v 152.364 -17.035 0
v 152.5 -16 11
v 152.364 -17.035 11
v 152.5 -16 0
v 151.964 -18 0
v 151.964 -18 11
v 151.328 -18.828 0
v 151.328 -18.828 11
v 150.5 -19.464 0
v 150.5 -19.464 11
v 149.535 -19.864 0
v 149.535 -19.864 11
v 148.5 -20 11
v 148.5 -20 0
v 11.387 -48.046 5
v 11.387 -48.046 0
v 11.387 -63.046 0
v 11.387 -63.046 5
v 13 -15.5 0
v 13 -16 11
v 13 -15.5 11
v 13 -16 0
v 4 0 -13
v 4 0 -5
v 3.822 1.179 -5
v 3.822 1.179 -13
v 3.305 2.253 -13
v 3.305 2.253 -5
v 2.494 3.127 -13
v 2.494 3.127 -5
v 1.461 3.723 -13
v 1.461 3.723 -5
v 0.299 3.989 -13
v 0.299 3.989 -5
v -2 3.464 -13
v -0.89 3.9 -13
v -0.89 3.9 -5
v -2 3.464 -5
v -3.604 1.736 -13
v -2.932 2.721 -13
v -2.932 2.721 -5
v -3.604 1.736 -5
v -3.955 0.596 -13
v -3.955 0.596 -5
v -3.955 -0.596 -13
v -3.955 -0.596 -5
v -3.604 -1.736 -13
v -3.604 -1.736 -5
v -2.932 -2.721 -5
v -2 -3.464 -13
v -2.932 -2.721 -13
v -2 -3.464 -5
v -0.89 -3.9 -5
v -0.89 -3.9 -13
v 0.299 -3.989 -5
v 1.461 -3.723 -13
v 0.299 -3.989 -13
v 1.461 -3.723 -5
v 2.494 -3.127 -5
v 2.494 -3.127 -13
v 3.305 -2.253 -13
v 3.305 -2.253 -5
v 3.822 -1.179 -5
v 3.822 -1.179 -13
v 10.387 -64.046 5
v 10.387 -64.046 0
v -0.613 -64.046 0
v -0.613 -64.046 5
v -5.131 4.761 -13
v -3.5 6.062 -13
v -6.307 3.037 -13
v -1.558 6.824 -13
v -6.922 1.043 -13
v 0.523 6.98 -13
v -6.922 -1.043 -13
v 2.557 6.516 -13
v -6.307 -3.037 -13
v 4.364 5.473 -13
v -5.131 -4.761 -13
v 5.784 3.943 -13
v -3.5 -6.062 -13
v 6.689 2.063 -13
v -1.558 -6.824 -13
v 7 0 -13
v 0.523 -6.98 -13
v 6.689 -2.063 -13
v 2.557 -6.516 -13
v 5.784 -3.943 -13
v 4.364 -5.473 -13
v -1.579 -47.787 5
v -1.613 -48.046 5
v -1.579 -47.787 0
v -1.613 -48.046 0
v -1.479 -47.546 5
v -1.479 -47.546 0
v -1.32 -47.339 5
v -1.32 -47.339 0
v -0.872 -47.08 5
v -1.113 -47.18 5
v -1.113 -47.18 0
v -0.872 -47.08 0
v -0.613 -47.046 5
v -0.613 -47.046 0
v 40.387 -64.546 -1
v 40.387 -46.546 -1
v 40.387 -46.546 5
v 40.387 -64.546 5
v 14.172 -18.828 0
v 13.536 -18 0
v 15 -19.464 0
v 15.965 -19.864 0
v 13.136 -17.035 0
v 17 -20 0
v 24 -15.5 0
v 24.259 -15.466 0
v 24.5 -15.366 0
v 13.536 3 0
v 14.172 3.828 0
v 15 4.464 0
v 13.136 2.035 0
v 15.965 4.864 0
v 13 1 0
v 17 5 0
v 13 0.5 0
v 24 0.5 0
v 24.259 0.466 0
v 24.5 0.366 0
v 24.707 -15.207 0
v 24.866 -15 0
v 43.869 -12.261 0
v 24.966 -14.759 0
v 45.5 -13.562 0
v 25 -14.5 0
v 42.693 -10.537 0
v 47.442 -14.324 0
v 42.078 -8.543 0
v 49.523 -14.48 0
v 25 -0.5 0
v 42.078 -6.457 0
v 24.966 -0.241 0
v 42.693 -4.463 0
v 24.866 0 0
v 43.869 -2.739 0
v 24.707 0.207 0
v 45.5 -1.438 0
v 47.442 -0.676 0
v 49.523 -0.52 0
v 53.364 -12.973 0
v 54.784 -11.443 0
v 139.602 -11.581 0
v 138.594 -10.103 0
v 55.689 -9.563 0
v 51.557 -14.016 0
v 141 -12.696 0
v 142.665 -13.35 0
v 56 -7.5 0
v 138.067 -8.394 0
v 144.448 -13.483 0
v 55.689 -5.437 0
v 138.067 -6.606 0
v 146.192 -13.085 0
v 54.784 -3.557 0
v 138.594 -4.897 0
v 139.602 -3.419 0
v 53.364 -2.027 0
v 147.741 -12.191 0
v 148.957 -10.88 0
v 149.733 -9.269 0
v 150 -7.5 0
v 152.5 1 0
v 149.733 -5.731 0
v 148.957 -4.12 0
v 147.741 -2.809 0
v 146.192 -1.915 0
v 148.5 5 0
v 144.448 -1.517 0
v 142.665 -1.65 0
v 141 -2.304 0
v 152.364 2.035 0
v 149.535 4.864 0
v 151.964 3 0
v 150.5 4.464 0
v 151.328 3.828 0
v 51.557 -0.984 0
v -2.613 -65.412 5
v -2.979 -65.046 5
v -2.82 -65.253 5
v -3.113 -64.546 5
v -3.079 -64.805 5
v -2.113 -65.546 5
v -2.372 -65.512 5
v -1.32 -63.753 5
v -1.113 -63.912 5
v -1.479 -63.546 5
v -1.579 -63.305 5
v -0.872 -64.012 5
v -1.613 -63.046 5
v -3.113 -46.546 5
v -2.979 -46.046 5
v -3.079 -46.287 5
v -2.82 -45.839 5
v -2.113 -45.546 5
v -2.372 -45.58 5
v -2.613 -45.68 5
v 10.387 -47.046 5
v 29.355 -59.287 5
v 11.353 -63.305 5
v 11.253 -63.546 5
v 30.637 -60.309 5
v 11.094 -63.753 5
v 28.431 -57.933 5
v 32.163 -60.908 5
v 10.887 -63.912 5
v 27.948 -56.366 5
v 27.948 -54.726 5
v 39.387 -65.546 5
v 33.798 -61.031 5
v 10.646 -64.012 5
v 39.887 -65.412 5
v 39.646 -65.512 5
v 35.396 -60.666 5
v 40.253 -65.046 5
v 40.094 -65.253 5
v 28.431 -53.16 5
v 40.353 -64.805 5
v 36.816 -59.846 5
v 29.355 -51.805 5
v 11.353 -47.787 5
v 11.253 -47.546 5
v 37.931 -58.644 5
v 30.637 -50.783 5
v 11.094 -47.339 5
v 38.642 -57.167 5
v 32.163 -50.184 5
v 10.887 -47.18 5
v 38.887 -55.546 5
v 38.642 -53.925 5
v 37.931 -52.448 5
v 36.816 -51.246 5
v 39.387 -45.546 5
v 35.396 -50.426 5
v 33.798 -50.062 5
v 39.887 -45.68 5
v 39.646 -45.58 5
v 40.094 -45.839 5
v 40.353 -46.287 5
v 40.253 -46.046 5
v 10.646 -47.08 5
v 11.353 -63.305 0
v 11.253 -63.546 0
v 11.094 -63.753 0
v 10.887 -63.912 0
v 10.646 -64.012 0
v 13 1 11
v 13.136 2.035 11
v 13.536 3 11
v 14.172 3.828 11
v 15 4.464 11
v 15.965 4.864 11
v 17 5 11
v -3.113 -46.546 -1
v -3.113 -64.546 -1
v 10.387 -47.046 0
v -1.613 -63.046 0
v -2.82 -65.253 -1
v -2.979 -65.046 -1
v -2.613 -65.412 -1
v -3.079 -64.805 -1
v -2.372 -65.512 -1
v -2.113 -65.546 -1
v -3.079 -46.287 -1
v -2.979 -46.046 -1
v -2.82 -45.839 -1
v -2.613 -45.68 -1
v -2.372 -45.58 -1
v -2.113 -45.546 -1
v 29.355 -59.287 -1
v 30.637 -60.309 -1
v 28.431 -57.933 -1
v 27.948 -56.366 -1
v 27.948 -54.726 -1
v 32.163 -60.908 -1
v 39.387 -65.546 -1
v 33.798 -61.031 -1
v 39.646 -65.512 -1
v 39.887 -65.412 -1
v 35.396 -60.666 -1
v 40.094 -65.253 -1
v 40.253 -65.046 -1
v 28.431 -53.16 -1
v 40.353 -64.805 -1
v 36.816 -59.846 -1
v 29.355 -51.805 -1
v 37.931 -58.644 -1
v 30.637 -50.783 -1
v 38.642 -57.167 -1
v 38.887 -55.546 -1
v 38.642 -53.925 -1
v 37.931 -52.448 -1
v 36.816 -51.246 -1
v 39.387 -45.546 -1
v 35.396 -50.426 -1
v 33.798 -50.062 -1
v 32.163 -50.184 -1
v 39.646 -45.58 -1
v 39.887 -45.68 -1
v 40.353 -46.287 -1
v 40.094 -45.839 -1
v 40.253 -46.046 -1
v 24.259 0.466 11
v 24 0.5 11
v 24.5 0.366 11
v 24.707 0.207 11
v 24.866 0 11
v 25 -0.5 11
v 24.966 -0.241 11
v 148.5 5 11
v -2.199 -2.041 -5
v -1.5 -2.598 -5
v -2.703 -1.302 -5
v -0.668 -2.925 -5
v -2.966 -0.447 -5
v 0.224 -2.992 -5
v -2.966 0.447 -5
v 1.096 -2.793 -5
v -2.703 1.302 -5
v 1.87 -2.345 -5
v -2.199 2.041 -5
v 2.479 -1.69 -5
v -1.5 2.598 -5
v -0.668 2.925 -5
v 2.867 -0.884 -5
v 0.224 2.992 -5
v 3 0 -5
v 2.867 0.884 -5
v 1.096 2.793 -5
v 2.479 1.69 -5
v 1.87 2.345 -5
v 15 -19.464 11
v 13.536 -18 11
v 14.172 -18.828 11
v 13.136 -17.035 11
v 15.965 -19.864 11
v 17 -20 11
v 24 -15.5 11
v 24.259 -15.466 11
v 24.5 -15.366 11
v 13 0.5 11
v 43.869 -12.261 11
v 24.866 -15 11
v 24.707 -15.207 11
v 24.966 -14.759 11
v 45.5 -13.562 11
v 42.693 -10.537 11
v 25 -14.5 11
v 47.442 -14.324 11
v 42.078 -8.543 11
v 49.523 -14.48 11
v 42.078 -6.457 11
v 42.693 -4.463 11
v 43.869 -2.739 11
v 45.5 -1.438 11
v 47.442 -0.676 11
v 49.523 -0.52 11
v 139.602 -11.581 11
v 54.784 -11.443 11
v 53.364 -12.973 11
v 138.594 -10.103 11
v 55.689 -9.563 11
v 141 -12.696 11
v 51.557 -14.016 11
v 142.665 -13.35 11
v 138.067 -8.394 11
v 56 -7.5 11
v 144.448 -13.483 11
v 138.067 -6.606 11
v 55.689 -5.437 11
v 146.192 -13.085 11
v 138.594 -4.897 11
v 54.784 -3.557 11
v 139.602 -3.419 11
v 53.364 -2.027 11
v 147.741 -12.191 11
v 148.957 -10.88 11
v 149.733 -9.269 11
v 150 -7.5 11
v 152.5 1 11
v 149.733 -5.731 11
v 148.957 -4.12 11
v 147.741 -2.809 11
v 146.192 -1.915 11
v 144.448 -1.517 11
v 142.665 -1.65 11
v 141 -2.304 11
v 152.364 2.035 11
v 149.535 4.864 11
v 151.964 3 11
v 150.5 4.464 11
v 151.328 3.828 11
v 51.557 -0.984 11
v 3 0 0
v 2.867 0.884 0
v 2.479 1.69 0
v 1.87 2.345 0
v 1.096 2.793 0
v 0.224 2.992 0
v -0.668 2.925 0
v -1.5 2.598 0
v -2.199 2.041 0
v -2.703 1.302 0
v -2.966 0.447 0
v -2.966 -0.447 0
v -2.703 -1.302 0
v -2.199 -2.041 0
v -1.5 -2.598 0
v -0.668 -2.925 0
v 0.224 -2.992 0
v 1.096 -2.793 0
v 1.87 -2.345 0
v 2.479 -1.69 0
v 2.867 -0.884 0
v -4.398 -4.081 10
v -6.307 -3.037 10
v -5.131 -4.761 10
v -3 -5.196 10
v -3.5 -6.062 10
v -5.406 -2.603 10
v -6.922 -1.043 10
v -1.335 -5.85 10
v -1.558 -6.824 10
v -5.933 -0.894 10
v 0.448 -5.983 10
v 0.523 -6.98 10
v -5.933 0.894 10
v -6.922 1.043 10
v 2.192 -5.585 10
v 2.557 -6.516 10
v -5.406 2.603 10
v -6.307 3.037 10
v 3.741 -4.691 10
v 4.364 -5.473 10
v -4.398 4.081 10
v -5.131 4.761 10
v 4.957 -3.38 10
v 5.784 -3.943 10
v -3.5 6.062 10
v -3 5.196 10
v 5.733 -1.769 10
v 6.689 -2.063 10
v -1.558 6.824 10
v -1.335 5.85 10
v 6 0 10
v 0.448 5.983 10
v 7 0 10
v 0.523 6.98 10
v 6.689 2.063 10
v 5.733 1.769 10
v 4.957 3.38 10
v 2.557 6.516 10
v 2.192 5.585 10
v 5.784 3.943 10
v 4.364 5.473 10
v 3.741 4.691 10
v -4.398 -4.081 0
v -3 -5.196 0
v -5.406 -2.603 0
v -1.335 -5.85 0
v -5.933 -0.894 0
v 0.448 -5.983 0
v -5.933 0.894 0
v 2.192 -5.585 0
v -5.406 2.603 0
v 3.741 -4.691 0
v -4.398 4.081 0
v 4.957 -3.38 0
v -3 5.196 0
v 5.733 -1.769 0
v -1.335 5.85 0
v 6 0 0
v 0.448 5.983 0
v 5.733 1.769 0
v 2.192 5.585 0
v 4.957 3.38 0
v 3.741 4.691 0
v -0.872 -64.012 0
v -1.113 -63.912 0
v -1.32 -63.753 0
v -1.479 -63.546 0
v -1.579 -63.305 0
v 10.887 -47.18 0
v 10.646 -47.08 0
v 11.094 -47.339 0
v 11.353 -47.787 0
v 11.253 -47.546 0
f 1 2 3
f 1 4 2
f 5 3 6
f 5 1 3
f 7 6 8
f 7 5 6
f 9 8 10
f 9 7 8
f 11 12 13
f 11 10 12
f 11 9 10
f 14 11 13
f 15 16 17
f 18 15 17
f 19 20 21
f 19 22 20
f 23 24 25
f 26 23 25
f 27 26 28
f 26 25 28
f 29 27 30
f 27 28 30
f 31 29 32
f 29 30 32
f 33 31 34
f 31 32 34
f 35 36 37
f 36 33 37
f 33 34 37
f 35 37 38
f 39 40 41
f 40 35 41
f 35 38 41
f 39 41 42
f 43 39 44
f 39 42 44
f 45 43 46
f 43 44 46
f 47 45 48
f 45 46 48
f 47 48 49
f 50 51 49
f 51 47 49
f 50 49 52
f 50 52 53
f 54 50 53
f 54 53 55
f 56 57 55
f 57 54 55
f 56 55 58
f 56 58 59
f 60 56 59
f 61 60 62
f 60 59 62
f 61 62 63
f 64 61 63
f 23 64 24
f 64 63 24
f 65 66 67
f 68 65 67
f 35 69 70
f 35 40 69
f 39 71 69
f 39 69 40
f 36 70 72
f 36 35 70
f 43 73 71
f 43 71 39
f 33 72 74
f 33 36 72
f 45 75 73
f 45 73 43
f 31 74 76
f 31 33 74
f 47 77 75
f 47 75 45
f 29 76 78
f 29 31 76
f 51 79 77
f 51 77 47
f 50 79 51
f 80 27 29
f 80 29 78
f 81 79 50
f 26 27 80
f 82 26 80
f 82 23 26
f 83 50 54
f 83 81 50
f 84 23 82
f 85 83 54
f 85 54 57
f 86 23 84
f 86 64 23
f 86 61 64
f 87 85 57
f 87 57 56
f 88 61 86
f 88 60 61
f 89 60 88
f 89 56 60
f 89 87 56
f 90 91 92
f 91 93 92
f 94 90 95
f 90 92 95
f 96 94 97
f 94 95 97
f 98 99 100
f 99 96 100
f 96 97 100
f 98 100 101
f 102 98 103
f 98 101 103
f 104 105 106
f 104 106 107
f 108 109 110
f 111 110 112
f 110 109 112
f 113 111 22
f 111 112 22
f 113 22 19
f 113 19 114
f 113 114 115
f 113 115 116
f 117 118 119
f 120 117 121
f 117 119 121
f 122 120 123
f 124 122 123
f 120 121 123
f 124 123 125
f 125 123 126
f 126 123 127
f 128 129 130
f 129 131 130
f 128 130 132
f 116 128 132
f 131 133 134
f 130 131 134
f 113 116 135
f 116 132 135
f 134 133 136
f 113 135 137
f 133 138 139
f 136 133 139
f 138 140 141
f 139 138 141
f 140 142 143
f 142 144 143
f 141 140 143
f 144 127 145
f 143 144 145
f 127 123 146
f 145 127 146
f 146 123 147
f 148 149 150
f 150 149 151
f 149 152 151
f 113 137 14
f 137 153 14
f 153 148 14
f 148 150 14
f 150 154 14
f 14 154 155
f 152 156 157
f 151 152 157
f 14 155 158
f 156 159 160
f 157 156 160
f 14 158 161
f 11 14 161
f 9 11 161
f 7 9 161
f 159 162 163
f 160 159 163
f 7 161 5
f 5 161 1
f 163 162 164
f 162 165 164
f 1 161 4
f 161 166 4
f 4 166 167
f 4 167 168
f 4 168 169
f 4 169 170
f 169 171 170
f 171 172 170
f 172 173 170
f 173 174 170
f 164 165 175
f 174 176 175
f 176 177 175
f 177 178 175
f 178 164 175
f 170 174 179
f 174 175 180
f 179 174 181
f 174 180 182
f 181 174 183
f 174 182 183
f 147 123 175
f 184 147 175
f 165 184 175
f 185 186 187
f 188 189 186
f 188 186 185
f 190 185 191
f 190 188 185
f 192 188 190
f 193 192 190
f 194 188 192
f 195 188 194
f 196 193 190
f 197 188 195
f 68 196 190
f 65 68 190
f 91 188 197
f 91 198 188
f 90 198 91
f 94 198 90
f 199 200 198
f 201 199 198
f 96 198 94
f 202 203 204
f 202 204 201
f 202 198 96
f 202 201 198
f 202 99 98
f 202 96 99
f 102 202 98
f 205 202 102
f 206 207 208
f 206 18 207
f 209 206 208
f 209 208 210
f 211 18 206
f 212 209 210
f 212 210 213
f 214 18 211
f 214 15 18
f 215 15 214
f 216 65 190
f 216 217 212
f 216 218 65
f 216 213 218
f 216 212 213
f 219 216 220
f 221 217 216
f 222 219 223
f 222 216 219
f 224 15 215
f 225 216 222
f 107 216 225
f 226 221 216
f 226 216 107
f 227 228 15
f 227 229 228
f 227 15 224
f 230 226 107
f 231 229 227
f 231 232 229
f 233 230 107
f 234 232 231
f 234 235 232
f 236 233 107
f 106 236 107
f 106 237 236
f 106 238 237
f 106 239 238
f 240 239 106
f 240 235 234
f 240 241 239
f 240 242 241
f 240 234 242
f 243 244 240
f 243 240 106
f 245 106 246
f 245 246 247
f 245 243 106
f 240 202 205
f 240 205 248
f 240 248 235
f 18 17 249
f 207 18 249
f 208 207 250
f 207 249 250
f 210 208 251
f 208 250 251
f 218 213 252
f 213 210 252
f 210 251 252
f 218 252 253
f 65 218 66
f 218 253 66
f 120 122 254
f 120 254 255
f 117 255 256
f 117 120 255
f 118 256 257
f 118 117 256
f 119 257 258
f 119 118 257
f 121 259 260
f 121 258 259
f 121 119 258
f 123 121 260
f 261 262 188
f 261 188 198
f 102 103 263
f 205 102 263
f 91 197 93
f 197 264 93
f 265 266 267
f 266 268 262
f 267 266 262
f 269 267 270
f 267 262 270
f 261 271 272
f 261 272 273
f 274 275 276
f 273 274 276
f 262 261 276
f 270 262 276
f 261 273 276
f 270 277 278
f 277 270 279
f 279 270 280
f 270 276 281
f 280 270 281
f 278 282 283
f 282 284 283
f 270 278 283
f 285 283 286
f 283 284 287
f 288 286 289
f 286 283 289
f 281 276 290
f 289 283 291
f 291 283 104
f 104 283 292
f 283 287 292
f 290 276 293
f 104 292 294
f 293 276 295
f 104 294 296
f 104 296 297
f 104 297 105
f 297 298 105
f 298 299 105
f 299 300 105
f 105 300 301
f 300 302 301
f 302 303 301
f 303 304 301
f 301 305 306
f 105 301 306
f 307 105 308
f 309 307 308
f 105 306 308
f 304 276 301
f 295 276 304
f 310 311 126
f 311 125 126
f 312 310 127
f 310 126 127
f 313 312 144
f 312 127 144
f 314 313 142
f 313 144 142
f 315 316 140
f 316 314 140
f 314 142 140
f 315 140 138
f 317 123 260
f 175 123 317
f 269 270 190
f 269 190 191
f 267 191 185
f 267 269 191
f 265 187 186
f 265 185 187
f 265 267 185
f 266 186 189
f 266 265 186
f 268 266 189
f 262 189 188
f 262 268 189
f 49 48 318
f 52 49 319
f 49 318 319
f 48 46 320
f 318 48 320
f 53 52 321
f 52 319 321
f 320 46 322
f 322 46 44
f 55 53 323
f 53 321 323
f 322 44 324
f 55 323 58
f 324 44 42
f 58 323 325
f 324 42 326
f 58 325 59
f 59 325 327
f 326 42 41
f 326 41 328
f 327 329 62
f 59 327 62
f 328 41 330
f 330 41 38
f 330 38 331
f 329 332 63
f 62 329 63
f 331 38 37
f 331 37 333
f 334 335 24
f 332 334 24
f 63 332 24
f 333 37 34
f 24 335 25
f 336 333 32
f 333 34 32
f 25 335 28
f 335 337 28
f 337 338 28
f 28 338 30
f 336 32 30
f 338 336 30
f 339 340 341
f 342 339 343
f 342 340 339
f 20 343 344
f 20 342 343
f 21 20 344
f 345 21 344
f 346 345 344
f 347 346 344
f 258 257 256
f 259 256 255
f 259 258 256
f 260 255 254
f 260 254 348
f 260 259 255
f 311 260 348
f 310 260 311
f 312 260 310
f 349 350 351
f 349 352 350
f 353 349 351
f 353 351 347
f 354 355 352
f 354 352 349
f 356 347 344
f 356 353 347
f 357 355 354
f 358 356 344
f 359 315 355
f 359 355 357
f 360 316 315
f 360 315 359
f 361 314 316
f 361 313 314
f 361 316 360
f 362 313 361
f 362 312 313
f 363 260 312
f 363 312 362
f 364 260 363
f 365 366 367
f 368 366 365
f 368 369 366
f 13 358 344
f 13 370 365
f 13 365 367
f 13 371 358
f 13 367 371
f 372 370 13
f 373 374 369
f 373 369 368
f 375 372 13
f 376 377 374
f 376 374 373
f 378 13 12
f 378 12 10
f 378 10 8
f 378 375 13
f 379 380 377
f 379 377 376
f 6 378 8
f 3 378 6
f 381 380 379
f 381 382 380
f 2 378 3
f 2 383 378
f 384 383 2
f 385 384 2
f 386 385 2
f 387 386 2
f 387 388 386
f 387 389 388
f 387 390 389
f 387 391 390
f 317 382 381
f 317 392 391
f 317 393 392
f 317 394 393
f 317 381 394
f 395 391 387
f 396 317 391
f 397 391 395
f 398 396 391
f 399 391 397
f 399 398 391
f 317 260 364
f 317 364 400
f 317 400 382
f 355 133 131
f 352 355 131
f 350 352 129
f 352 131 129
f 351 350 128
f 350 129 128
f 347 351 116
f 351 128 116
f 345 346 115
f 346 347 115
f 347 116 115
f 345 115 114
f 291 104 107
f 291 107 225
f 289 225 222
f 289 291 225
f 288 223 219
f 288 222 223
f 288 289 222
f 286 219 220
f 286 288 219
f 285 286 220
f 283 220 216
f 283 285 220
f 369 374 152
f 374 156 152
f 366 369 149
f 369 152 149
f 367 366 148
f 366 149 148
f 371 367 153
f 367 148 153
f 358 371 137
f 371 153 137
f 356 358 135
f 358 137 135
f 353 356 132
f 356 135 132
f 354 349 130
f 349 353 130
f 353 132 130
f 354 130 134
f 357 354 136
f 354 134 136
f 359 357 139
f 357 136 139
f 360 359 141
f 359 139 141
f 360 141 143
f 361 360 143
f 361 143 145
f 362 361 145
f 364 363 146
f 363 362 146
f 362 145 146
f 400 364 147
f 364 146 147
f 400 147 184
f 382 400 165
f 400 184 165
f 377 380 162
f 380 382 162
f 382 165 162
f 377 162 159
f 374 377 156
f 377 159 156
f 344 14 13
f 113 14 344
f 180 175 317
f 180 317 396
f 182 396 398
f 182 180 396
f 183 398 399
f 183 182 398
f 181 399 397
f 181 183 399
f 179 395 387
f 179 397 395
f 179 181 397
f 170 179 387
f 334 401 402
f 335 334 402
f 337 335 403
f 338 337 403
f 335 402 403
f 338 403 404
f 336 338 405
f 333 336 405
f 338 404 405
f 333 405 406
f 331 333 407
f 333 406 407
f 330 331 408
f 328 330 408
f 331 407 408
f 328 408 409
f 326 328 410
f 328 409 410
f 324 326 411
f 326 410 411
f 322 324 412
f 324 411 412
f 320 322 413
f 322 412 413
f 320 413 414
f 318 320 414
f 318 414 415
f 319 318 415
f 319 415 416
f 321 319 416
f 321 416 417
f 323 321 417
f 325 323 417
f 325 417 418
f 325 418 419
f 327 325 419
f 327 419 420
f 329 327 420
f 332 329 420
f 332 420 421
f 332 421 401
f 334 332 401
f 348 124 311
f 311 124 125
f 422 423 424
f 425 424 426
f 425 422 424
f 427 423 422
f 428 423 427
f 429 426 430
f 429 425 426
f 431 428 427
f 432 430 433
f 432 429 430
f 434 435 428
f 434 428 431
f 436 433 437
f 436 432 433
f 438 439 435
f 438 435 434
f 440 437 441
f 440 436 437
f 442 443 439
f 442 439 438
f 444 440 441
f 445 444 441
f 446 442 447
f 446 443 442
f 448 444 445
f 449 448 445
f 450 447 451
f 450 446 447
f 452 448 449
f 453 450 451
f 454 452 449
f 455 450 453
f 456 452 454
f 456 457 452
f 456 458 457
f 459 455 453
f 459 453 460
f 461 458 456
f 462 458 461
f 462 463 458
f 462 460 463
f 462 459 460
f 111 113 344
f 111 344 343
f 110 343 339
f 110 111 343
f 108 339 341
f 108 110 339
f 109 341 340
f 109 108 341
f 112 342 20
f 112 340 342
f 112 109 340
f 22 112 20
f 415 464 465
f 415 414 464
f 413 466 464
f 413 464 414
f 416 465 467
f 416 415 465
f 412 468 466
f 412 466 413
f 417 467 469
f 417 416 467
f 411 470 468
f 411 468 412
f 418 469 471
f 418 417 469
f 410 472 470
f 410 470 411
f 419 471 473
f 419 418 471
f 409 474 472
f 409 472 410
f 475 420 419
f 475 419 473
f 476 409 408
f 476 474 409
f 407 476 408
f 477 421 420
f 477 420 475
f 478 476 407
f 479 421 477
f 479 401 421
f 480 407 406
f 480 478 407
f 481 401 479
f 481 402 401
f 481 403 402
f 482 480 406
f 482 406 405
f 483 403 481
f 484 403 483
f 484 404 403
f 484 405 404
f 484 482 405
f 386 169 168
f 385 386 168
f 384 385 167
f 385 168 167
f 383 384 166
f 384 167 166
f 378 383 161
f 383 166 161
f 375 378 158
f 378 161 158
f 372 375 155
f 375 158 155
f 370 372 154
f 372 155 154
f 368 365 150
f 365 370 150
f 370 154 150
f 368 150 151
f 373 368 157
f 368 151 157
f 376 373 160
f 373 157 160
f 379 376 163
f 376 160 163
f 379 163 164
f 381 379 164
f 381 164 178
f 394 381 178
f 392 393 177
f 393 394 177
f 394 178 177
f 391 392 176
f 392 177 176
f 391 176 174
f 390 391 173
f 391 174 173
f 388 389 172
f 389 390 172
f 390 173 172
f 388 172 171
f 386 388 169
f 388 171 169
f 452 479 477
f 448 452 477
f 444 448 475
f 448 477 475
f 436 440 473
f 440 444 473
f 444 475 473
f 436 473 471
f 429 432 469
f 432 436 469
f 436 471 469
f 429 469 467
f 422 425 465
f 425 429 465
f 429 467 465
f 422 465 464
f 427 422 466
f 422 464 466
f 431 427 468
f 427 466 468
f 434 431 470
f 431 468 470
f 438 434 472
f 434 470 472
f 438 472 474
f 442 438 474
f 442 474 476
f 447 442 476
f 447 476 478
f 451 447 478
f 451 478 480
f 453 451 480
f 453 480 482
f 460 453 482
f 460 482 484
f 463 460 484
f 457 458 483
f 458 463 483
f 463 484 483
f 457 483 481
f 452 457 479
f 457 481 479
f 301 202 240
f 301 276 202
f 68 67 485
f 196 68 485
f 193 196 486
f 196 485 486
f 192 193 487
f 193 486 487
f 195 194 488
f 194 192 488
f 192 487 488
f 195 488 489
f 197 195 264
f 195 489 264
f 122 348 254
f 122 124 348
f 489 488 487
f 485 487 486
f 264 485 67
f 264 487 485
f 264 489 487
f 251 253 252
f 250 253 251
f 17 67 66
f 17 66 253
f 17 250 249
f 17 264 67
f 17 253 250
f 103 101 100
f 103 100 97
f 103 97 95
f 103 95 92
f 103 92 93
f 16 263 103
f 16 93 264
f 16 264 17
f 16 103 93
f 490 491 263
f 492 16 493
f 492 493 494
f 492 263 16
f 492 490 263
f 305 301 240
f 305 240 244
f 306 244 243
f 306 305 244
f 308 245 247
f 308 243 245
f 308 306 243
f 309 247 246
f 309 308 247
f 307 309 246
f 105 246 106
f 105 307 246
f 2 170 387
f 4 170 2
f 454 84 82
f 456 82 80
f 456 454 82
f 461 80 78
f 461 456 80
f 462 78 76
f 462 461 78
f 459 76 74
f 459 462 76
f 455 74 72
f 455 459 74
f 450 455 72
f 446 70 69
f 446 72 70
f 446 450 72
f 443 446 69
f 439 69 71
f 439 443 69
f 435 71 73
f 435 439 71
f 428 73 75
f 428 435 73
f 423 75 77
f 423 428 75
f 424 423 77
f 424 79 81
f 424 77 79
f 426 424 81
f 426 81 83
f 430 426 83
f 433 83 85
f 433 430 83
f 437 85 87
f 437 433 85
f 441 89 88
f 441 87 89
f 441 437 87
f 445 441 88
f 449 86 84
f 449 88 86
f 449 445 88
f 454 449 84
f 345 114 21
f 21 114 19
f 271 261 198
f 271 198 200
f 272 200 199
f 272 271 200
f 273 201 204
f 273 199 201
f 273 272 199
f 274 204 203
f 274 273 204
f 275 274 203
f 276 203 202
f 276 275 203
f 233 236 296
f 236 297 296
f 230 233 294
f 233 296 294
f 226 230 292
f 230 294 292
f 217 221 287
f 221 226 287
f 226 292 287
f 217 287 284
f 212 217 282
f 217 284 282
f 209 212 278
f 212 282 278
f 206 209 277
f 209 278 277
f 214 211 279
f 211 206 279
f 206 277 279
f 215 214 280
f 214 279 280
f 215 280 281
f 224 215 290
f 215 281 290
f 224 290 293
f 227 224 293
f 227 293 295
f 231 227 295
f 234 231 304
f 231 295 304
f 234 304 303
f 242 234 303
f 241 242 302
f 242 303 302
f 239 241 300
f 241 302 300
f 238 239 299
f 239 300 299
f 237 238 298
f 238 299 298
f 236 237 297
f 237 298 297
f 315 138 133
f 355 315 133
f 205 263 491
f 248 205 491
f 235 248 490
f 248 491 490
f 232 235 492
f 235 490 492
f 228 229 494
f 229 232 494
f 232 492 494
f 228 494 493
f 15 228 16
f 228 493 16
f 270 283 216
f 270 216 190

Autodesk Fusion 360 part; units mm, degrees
sketch "Sketch1" plane through (0, 0, 0) normal (0, 0, 1) x (1, 0, 0)
  circle A0 centre (0, 0) radius 2.5
  circle A1 centre (0, 0) radius 3
  circle A2 centre (0, 0) radius 6
  circle A3 centre (0, 0) radius 7
  dimension "d1" = 5
  dimension "d2" = 0.5
  dimension "d5" = 12
  dimension "d6" = 1
extrude "Extrude1" add sketch "Sketch1" along normal blind 10 contours A3 makes body 1
extrude "Extrude2" add sketch "Sketch1" against normal blind 5 contours A2 | A3 bodies 1
sketch "Sketch2" plane through (0, 0, 0) normal (0, 0, 1) x (1, 0, 0)
  line L0 (17, 5) -> (148.5, 5)
  line L1 (152.5, 1) -> (152.5, -16)
  line L2 (148.5, -20) -> (17, -20)
  line L3 (13, -16) -> (13, 1)
  line L4 (13, 0.5) -> (24, 0.5)
  line L5 (25, -0.5) -> (25, -14.5)
  line L6 (24, -15.5) -> (13, -15.5)
  line L7 (13, -15.5) -> (13, 0.5)
  circle A0 centre (49, -7.5) radius 6.5
  circle A1 centre (49, -7.5) radius 7
  circle A2 centre (144, -7.5) radius 6
  arc A3 (17, 5) -> (13, 1) centre (17, 1) ccw
  arc A4 (13, -16) -> (17, -20) centre (17, -16) ccw
  arc A5 (148.5, -20) -> (152.5, -16) centre (148.5, -16) ccw
  arc A6 (152.5, 1) -> (148.5, 5) centre (148.5, 1) ccw
  arc A7 (25, -0.5) -> (24, 0.5) centre (24, -0.5) ccw
  arc A8 (24, -15.5) -> (25, -14.5) centre (24, -14.5) ccw
  point P0 (12.5, -1.5)
  dimension "d9" = 25
  dimension "d10" = 16
  dimension "d11" = 4.5
  dimension "d12" = 4.5
  dimension "d13" = 12
  dimension "d14" = 24
  dimension "d15" = 13
  dimension "d16" = 0.5
  dimension "d17" = 95
  dimension "d18" = 12.5
  dimension "d19" = 12.5
  dimension "d20" = 12.5
  dimension "d21" = 12.5
  dimension "d22" = 12
  dimension "d39" = 4
  dimension "d40" = 4
  dimension "d41" = 1
  dimension "d47" = 8.5
extrude "Extrude3" add sketch "Sketch2" along normal blind 11 separate body contours L0 L1 L2 L3 L4 L5 L6 A3 A4 A5 A6 A7 A8 makes body 2
sketch "Sketch3" plane through (0, 0, 0) normal (0, 0, 1) x (1, 0, 0)
  line L0 (-2.1132, -45.5462) -> (39.3868, -45.5462)
  line L1 (40.3868, -46.5462) -> (40.3868, -64.5462)
  line L2 (39.3868, -65.5462) -> (-2.1132, -65.5462)
  line L3 (-3.1132, -64.5462) -> (-3.1132, -46.5462)
  line L4 (-0.6132, -47.0462) -> (10.3868, -47.0462)
  line L5 (11.3868, -48.0462) -> (11.3868, -63.0462)
  line L6 (10.3868, -64.0462) -> (-0.6132, -64.0462)
  line L7 (-1.6132, -63.0462) -> (-1.6132, -48.0462)
  circle A0 centre (33.3868, -55.5462) radius 5.5
  arc A1 (-0.6132, -47.0462) -> (-1.6132, -48.0462) centre (-0.6132, -48.0462) ccw
  arc A2 (11.3868, -48.0462) -> (10.3868, -47.0462) centre (10.3868, -48.0462) ccw
  arc A3 (10.3868, -64.0462) -> (11.3868, -63.0462) centre (10.3868, -63.0462) ccw
  arc A4 (-1.6132, -63.0462) -> (-0.6132, -64.0462) centre (-0.6132, -63.0462) ccw
  arc A5 (-2.1132, -45.5462) -> (-3.1132, -46.5462) centre (-2.1132, -46.5462) ccw
  arc A6 (-3.1132, -64.5462) -> (-2.1132, -65.5462) centre (-2.1132, -64.5462) ccw
  arc A7 (39.3868, -65.5462) -> (40.3868, -64.5462) centre (39.3868, -64.5462) ccw
  arc A8 (40.3868, -46.5462) -> (39.3868, -45.5462) centre (39.3868, -46.5462) ccw
  dimension "d25" = 20
  dimension "d26" = 17
  dimension "d27" = 1.5
  dimension "d28" = 1.5
  dimension "d29" = 1.5
  dimension "d30" = 22
  dimension "d31" = 10
  dimension "d32" = 10
  dimension "d33" = 7
  dimension "d34" = 11
  dimension "d42" = 13
  dimension "d43" = 1
  dimension "d44" = 1
extrude "Extrude4" add sketch "Sketch3" along normal blind 5 separate body makes body 3
extrude "Extrude5" add sketch "Sketch3" against normal blind 1 contours L0 L1 L2 L3 A5 A6 A7 A8 | L4 L5 L6 L7 A1 A2 A3 A4 | A0 bodies 3
extrude "Extrude6" cut 1 faces at (36.2412, -54.5134, 0) along direction (0, 0, -1) blind 1 on bodies 3 bodies 3
sketch "Sketch4" plane through (0, 0, -5) normal (0, 0, -1) x (1, 0, 0)
  circle A0 centre (0, 0) radius 3
  circle A1 centre (0, 0) radius 7
  circle A2 centre (0, 0) radius 4
  dimension "d48" = 8
extrude "Extrude7" add sketch "Sketch4" along normal blind 8 contours A1 bodies 1
